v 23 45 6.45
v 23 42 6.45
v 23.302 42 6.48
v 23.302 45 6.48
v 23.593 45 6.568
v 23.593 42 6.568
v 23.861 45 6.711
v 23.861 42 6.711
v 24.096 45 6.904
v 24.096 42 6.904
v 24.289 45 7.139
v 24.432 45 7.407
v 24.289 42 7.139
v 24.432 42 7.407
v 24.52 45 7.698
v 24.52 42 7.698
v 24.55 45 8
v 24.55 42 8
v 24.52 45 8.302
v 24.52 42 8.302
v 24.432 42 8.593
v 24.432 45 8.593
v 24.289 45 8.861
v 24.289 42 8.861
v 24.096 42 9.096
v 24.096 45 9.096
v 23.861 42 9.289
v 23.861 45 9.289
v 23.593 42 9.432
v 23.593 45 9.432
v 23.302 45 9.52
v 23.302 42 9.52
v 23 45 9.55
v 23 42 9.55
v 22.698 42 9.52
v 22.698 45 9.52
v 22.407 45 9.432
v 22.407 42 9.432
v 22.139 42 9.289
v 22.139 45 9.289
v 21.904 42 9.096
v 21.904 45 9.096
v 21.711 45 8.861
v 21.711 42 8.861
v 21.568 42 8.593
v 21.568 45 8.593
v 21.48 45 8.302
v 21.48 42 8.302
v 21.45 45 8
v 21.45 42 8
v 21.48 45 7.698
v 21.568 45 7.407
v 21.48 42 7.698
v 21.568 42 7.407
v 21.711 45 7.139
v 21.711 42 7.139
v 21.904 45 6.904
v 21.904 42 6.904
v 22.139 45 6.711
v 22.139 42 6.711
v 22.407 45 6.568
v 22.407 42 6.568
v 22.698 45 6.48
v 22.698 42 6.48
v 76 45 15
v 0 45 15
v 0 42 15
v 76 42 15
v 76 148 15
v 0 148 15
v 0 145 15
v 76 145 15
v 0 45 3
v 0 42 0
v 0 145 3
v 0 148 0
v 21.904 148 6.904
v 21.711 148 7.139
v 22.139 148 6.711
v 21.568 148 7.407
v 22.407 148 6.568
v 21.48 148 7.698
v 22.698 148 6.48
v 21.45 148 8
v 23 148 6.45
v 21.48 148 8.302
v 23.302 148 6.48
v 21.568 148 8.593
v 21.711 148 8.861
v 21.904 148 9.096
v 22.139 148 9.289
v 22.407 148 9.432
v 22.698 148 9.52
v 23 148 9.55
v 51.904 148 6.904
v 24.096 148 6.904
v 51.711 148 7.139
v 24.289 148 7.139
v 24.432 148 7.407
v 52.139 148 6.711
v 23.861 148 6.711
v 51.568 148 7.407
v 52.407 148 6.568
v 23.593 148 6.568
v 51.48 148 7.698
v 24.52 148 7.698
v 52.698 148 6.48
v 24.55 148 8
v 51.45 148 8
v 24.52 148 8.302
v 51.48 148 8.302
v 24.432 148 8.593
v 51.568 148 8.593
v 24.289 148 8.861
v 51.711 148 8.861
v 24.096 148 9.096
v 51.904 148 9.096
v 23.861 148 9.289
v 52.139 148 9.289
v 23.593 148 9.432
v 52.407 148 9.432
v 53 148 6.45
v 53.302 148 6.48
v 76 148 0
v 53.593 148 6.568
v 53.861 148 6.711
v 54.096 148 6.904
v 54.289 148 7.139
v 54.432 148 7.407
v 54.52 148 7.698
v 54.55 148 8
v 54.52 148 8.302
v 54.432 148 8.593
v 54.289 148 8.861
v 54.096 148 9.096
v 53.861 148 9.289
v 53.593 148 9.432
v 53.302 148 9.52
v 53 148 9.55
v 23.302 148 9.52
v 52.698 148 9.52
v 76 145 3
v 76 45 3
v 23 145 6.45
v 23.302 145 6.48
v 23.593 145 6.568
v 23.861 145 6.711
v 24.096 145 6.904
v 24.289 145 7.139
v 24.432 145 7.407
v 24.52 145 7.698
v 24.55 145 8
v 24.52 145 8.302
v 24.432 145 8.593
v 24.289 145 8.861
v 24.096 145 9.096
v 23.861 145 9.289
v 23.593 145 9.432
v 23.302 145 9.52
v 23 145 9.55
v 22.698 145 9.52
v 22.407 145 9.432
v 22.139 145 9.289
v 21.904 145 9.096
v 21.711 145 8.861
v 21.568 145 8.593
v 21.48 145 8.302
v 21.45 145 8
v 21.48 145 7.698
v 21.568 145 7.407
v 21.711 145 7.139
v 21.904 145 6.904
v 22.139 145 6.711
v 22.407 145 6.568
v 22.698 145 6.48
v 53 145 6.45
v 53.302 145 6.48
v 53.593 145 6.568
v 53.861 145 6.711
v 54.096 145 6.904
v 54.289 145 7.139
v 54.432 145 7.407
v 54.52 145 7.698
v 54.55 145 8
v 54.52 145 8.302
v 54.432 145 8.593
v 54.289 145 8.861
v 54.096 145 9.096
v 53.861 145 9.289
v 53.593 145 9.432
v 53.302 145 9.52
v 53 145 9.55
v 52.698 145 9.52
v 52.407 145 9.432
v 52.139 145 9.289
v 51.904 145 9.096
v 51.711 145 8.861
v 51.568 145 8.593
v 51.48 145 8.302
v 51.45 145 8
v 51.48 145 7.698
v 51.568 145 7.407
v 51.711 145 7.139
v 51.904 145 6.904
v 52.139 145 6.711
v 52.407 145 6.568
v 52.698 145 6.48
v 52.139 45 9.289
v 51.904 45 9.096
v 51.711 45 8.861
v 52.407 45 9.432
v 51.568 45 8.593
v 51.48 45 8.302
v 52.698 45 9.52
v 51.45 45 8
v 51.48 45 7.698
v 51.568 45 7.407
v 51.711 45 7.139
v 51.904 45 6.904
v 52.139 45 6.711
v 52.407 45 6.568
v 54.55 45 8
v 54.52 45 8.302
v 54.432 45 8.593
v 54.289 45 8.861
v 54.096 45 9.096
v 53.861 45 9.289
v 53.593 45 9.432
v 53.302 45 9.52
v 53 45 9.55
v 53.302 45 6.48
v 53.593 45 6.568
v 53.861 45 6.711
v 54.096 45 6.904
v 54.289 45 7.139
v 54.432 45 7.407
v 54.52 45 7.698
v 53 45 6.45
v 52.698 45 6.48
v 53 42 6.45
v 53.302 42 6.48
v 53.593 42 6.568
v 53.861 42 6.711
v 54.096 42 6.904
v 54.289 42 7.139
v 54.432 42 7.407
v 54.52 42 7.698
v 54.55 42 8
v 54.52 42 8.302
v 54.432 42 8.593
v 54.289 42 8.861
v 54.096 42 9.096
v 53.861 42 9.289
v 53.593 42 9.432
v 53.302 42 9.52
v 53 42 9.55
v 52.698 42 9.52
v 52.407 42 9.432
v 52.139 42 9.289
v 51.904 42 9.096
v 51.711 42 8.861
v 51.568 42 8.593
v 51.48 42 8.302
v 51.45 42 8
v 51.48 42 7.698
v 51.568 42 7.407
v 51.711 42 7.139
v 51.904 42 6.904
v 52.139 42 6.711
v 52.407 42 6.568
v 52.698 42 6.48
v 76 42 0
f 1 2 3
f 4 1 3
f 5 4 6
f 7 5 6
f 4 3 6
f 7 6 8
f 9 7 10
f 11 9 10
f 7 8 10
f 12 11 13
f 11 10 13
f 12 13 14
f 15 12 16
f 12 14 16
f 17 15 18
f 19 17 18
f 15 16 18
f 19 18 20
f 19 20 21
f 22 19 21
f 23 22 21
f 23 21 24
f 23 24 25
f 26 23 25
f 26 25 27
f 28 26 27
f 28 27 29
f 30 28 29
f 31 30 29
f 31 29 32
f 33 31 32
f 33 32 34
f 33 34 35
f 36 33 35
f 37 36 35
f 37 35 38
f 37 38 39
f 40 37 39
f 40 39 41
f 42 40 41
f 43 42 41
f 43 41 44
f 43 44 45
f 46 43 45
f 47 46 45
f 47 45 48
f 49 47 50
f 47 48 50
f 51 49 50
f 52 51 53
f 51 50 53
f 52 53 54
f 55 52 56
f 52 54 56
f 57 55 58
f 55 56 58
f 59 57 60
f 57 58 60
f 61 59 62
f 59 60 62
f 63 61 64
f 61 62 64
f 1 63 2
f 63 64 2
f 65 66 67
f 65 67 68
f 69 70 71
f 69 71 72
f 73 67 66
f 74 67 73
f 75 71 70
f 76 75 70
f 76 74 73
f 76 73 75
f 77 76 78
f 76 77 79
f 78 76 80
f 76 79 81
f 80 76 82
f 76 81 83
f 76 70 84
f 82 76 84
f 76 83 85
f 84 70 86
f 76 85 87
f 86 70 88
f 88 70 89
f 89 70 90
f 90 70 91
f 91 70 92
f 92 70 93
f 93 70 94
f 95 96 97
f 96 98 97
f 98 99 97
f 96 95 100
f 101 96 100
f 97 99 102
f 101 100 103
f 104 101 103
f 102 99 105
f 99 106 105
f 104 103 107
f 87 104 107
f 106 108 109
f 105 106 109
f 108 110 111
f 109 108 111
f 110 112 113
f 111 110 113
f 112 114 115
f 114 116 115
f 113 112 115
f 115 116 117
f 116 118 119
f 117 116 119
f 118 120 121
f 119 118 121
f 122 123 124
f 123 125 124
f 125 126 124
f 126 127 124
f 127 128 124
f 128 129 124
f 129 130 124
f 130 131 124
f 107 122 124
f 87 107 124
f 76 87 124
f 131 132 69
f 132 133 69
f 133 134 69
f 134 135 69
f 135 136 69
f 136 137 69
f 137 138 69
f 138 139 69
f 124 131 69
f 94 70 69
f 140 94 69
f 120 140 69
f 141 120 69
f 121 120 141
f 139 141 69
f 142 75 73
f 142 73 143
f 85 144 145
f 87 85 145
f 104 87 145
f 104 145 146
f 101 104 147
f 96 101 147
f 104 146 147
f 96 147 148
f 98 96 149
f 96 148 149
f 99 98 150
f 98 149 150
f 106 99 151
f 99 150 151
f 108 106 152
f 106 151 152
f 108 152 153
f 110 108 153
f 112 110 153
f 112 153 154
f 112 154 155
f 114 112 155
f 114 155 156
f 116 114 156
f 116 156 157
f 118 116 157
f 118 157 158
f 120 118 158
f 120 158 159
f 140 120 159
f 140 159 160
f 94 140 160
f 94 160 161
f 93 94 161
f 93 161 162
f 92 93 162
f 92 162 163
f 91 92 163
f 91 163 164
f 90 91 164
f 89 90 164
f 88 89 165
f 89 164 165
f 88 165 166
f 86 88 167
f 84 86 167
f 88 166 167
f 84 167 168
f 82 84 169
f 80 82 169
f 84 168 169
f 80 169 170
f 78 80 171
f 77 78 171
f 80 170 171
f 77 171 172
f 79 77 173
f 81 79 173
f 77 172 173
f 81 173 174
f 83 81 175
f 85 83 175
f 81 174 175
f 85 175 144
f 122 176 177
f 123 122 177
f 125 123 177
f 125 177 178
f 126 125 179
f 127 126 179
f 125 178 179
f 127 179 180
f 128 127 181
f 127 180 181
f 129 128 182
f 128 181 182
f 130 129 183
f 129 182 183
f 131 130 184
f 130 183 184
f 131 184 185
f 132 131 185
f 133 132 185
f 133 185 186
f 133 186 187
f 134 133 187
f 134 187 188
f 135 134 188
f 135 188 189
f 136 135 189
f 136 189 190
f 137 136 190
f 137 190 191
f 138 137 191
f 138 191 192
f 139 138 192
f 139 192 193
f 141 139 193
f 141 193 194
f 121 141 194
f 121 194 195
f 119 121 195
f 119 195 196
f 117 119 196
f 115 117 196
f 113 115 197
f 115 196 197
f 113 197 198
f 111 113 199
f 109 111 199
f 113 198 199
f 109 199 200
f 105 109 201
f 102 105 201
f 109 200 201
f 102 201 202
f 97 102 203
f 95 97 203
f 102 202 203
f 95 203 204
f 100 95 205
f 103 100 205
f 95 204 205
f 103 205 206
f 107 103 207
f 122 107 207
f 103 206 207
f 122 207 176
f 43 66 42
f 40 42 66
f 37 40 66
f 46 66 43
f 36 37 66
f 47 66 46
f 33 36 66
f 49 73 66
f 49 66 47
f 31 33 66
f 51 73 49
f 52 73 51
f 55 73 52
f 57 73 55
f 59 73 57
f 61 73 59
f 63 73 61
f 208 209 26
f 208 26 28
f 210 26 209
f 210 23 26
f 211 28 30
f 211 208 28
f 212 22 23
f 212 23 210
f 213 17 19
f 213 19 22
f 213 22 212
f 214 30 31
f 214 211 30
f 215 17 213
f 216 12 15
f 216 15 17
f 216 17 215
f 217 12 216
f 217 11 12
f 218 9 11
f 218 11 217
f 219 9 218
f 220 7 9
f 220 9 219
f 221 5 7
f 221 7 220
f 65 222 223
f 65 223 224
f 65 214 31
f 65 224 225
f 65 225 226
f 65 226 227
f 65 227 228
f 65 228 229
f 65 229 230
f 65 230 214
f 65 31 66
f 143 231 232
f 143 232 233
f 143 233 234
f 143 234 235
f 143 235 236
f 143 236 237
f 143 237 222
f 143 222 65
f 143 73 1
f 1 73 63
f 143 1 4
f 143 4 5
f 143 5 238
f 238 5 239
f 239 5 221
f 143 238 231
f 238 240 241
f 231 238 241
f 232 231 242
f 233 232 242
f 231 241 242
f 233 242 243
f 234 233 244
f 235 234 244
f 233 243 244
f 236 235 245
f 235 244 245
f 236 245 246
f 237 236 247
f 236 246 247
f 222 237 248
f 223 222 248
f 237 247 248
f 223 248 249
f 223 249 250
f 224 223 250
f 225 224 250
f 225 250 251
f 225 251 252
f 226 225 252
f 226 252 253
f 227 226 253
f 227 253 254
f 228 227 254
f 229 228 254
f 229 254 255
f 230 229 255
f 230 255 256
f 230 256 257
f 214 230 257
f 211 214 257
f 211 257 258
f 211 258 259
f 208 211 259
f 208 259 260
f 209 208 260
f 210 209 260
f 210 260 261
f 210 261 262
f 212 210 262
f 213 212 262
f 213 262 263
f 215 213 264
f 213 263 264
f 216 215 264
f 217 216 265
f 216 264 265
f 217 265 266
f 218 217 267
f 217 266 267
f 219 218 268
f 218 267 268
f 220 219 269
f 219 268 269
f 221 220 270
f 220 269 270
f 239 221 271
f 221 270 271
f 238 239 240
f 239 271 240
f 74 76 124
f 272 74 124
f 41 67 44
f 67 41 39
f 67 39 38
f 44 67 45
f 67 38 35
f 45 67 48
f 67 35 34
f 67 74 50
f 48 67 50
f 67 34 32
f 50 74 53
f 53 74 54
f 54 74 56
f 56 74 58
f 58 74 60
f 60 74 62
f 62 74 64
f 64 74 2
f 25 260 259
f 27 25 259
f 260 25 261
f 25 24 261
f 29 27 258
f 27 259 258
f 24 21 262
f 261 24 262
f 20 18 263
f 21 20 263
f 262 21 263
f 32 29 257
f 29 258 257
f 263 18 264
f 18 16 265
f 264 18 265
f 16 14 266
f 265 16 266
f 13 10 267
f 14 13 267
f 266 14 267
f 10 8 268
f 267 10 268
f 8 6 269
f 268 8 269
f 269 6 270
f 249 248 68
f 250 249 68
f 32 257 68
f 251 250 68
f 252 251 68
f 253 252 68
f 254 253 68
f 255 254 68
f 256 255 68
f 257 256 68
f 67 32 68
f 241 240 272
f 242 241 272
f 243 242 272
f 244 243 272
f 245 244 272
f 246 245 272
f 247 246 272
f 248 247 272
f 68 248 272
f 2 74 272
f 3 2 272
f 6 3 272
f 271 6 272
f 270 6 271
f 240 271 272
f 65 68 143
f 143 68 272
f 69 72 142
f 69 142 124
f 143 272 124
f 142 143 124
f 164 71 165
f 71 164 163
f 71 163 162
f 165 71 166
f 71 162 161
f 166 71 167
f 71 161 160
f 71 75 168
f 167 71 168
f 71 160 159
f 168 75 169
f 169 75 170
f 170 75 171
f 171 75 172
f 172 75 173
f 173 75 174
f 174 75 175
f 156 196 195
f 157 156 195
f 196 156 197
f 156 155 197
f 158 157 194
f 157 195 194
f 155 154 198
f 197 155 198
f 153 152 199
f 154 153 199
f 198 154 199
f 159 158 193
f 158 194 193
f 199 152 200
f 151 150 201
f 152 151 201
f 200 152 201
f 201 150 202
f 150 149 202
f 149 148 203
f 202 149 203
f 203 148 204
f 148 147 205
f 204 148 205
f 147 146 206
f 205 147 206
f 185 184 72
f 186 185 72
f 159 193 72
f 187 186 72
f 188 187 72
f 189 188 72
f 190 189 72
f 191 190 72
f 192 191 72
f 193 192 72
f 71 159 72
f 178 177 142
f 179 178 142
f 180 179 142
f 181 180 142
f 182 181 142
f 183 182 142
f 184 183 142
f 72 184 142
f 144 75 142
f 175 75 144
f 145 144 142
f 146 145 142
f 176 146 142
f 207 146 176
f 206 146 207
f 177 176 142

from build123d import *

# Parameters (mm, degrees)
SKETCH_1_W          = 76
SKETCH_1_H          = 190
SKETCH_1_R          = 1.55
EXTRUDE_1_DEPTH     = 3
SKETCH_2_W          = 76
SKETCH_2_H          = 3
EXTRUDE_2_DEPTH     = 12
SKETCH_3_R          = 1.55
CUT_EXTRUDE_1_DEPTH = 168.047897323
SKETCH_4_W          = 76
SKETCH_4_H          = 42
CUT_EXTRUDE_2_DEPTH = 10


with BuildPart() as part:
    # 草图1 → 凸台-拉伸1 (new body)
    with BuildSketch(Plane.XY):
        with Locations((38, 95)):
            Rectangle(SKETCH_1_W, SKETCH_1_H)
        with Locations((63, 10)):
            Circle(SKETCH_1_R, mode=Mode.SUBTRACT)
        with Locations((13, 10)):
            Circle(SKETCH_1_R, mode=Mode.SUBTRACT)
        with Locations((63, 180)):
            Circle(SKETCH_1_R, mode=Mode.SUBTRACT)
        with Locations((13, 180)):
            Circle(SKETCH_1_R, mode=Mode.SUBTRACT)
    extrude(amount=EXTRUDE_1_DEPTH)

    # 草图2 → 凸台-拉伸2 (add)
    with BuildSketch(Plane.XY.offset(3)):
        with Locations((38, 43.5)):
            Rectangle(SKETCH_2_W, SKETCH_2_H)
        with Locations((38, 146.5)):
            Rectangle(SKETCH_2_W, SKETCH_2_H)
    extrude(amount=EXTRUDE_2_DEPTH)

    # 草图3 → 切除-拉伸1 (cut, through all)
    with BuildSketch(Plane.XZ.offset(-42)):
        with Locations(Location((23, 8, 0), (0, 0, 270))):
            Circle(SKETCH_3_R)
        with Locations(Location((53, 8, 0), (0, 0, 270))):
            Circle(SKETCH_3_R)
    extrude(amount=-CUT_EXTRUDE_1_DEPTH, mode=Mode.SUBTRACT)

    # 草图4 → 切除-拉伸2 (cut)
    with BuildSketch(Plane.XY.offset(3)):
        with Locations((38, 21)):
            Rectangle(SKETCH_4_W, SKETCH_4_H)
        with Locations((38, 169)):
            Rectangle(SKETCH_4_W, SKETCH_4_H)
    extrude(amount=-CUT_EXTRUDE_2_DEPTH, mode=Mode.SUBTRACT)


solid = part.part
